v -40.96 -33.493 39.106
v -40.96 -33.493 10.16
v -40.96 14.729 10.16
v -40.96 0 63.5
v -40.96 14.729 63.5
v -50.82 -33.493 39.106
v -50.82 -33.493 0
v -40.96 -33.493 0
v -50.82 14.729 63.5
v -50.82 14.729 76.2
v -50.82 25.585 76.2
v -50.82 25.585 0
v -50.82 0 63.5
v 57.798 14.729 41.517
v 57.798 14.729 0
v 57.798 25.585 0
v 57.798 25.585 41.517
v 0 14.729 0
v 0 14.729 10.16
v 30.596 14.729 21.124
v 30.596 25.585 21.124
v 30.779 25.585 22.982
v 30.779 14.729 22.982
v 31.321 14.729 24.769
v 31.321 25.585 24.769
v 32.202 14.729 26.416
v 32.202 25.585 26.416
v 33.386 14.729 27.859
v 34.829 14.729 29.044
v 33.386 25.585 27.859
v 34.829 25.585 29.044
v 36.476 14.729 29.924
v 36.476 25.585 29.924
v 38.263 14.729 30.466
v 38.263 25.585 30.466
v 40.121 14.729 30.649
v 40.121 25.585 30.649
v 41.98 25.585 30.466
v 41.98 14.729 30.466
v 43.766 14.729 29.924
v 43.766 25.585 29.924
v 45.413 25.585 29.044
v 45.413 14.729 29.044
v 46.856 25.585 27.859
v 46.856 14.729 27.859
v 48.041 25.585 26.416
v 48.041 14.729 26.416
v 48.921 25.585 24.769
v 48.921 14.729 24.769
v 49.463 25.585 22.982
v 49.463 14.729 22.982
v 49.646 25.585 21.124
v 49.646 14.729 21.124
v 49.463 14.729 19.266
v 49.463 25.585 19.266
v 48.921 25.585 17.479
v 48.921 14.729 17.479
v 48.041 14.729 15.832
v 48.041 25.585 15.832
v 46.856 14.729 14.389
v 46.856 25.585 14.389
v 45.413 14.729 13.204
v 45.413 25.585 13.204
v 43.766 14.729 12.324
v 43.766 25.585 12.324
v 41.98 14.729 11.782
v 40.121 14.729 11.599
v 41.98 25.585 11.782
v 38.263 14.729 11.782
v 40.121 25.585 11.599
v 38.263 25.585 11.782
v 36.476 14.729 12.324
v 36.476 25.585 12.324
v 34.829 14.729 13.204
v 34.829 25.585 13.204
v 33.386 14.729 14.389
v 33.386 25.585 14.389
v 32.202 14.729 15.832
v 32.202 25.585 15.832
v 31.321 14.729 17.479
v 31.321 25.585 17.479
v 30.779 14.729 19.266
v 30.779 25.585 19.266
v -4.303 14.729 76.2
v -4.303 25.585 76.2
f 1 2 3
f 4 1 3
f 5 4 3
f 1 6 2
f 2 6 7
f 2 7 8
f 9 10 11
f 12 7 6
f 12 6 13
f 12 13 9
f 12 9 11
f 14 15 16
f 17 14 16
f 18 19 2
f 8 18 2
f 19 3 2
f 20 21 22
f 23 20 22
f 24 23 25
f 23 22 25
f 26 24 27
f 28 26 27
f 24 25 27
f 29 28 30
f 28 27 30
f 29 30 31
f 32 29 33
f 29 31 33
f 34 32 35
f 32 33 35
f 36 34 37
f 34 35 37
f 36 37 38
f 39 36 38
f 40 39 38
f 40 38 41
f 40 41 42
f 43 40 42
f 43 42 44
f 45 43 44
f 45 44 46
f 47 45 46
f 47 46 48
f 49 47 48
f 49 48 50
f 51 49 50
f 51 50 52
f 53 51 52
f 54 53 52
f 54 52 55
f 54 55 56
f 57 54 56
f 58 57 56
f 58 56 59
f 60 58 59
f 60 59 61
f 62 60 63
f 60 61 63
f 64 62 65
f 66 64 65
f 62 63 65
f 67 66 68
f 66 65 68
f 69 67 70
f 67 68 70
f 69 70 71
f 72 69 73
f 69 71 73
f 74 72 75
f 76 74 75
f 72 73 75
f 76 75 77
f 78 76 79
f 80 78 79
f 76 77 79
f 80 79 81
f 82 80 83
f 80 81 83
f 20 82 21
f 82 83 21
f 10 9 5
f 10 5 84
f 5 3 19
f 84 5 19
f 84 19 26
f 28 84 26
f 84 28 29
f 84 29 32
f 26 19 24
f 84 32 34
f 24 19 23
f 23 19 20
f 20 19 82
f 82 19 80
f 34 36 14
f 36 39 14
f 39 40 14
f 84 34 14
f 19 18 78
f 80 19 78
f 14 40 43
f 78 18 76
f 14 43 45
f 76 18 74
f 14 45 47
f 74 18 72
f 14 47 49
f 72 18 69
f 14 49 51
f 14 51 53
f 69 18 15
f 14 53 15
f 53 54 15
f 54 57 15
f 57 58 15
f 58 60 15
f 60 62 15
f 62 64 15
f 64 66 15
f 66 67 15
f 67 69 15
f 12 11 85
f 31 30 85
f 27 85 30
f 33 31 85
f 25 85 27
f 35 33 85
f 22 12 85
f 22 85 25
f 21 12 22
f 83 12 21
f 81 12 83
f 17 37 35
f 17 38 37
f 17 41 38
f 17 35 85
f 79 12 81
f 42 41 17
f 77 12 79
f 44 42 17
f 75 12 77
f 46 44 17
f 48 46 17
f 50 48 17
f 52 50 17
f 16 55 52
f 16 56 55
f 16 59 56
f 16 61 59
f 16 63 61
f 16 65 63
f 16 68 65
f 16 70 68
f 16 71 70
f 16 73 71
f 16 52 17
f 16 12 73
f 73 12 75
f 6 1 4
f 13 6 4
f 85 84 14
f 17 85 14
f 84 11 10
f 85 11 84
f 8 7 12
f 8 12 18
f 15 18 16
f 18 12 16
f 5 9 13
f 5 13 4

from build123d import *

# Parameters (mm, degrees)
F0_W      = 108.6182296276
F0_H      = 59.0771511197
F1_DEPTH  = 25.4
F2_W      = 108.6182296276
F2_H      = 10.8553785831
F3_DEPTH  = 50.8
F4_W      = 9.8601616919
F4_H      = 48.2217725366
F5_DEPTH  = 38.1
F7_DEPTH  = 25.4
F9_DEPTH  = 25.4
F11_DEPTH = 25.4
F13_D     = 19.05
F14_DEPTH = 15.24
F16_DEPTH = 15.24


with BuildPart() as f1:
    # F0 (on Top) → F1 (new body)
    with BuildSketch(Plane.XY):
        with Locations((3.4888088703, -3.9539821446)):
            Rectangle(F0_W, F0_H)
    extrude(amount=F1_DEPTH)

    # F2 (on face) → F3 (join)
    with BuildSketch(Plane.XY.offset(25.4)):
        with Locations((3.4888088703, 20.1569041237)):
            Rectangle(F2_W, F2_H)
    extrude(amount=F3_DEPTH)

    # F4 (on face) → F5 (join)
    with BuildSketch(Plane.XY.offset(25.4)):
        with Locations((-45.8902250975, -9.3816714361)):
            Rectangle(F4_W, F4_H)
    extrude(amount=F5_DEPTH)

    # F6 (on face) → F7 (cut)
    with BuildSketch(Plane.YZ.offset(-40.9601442516)):
        Polygon((-33.4925577044, 39.1064621508), (0, 63.5), (-33.4925577044, 63.5), align=None)
    extrude(amount=-F7_DEPTH, mode=Mode.SUBTRACT)

    # F8 (on face) → F9 (cut)
    with BuildSketch(Plane.XY.offset(25.4)):
        Polygon((57.7979236841, 14.7292148322), (0, 14.7292148322), (-40.9601442516, -33.4925577044), (57.7979236841, -33.4925577044), align=None)
    extrude(amount=-F9_DEPTH, mode=Mode.SUBTRACT)

    # F10 (on face) → F11 (cut)
    with BuildSketch(Plane.XZ.offset(-14.7292148322)):
        Polygon((57.7979236841, 76.2), (-4.3028630316, 76.2), (57.7979236841, 41.5174737573), align=None)
    extrude(amount=-F11_DEPTH, mode=Mode.SUBTRACT)

    # F13 (through all)
    with Locations(Plane.XZ.offset(-14.7292148322)):
        with Locations((40.121294558, 21.1239363998)):
            Hole(F13_D / 2)

    # F14 (add): a face of the model
    f14_faces = [f1.faces().sort_by_distance(p)[0] for p in [
        (-27.3067628344, -1.3447093467, 25.4),
    ]]
    extrude(f14_faces, amount=-F14_DEPTH)

    # F15 (on face) → F16 (cut)
    with BuildSketch(Plane.XY.offset(25.4)):
        Polygon((0, 14.7292148322), (-40.9601442516, 14.7292148322), (-40.9601442516, -33.4925577044), align=None)
    extrude(amount=-F16_DEPTH, mode=Mode.SUBTRACT)


solid = f1.part
